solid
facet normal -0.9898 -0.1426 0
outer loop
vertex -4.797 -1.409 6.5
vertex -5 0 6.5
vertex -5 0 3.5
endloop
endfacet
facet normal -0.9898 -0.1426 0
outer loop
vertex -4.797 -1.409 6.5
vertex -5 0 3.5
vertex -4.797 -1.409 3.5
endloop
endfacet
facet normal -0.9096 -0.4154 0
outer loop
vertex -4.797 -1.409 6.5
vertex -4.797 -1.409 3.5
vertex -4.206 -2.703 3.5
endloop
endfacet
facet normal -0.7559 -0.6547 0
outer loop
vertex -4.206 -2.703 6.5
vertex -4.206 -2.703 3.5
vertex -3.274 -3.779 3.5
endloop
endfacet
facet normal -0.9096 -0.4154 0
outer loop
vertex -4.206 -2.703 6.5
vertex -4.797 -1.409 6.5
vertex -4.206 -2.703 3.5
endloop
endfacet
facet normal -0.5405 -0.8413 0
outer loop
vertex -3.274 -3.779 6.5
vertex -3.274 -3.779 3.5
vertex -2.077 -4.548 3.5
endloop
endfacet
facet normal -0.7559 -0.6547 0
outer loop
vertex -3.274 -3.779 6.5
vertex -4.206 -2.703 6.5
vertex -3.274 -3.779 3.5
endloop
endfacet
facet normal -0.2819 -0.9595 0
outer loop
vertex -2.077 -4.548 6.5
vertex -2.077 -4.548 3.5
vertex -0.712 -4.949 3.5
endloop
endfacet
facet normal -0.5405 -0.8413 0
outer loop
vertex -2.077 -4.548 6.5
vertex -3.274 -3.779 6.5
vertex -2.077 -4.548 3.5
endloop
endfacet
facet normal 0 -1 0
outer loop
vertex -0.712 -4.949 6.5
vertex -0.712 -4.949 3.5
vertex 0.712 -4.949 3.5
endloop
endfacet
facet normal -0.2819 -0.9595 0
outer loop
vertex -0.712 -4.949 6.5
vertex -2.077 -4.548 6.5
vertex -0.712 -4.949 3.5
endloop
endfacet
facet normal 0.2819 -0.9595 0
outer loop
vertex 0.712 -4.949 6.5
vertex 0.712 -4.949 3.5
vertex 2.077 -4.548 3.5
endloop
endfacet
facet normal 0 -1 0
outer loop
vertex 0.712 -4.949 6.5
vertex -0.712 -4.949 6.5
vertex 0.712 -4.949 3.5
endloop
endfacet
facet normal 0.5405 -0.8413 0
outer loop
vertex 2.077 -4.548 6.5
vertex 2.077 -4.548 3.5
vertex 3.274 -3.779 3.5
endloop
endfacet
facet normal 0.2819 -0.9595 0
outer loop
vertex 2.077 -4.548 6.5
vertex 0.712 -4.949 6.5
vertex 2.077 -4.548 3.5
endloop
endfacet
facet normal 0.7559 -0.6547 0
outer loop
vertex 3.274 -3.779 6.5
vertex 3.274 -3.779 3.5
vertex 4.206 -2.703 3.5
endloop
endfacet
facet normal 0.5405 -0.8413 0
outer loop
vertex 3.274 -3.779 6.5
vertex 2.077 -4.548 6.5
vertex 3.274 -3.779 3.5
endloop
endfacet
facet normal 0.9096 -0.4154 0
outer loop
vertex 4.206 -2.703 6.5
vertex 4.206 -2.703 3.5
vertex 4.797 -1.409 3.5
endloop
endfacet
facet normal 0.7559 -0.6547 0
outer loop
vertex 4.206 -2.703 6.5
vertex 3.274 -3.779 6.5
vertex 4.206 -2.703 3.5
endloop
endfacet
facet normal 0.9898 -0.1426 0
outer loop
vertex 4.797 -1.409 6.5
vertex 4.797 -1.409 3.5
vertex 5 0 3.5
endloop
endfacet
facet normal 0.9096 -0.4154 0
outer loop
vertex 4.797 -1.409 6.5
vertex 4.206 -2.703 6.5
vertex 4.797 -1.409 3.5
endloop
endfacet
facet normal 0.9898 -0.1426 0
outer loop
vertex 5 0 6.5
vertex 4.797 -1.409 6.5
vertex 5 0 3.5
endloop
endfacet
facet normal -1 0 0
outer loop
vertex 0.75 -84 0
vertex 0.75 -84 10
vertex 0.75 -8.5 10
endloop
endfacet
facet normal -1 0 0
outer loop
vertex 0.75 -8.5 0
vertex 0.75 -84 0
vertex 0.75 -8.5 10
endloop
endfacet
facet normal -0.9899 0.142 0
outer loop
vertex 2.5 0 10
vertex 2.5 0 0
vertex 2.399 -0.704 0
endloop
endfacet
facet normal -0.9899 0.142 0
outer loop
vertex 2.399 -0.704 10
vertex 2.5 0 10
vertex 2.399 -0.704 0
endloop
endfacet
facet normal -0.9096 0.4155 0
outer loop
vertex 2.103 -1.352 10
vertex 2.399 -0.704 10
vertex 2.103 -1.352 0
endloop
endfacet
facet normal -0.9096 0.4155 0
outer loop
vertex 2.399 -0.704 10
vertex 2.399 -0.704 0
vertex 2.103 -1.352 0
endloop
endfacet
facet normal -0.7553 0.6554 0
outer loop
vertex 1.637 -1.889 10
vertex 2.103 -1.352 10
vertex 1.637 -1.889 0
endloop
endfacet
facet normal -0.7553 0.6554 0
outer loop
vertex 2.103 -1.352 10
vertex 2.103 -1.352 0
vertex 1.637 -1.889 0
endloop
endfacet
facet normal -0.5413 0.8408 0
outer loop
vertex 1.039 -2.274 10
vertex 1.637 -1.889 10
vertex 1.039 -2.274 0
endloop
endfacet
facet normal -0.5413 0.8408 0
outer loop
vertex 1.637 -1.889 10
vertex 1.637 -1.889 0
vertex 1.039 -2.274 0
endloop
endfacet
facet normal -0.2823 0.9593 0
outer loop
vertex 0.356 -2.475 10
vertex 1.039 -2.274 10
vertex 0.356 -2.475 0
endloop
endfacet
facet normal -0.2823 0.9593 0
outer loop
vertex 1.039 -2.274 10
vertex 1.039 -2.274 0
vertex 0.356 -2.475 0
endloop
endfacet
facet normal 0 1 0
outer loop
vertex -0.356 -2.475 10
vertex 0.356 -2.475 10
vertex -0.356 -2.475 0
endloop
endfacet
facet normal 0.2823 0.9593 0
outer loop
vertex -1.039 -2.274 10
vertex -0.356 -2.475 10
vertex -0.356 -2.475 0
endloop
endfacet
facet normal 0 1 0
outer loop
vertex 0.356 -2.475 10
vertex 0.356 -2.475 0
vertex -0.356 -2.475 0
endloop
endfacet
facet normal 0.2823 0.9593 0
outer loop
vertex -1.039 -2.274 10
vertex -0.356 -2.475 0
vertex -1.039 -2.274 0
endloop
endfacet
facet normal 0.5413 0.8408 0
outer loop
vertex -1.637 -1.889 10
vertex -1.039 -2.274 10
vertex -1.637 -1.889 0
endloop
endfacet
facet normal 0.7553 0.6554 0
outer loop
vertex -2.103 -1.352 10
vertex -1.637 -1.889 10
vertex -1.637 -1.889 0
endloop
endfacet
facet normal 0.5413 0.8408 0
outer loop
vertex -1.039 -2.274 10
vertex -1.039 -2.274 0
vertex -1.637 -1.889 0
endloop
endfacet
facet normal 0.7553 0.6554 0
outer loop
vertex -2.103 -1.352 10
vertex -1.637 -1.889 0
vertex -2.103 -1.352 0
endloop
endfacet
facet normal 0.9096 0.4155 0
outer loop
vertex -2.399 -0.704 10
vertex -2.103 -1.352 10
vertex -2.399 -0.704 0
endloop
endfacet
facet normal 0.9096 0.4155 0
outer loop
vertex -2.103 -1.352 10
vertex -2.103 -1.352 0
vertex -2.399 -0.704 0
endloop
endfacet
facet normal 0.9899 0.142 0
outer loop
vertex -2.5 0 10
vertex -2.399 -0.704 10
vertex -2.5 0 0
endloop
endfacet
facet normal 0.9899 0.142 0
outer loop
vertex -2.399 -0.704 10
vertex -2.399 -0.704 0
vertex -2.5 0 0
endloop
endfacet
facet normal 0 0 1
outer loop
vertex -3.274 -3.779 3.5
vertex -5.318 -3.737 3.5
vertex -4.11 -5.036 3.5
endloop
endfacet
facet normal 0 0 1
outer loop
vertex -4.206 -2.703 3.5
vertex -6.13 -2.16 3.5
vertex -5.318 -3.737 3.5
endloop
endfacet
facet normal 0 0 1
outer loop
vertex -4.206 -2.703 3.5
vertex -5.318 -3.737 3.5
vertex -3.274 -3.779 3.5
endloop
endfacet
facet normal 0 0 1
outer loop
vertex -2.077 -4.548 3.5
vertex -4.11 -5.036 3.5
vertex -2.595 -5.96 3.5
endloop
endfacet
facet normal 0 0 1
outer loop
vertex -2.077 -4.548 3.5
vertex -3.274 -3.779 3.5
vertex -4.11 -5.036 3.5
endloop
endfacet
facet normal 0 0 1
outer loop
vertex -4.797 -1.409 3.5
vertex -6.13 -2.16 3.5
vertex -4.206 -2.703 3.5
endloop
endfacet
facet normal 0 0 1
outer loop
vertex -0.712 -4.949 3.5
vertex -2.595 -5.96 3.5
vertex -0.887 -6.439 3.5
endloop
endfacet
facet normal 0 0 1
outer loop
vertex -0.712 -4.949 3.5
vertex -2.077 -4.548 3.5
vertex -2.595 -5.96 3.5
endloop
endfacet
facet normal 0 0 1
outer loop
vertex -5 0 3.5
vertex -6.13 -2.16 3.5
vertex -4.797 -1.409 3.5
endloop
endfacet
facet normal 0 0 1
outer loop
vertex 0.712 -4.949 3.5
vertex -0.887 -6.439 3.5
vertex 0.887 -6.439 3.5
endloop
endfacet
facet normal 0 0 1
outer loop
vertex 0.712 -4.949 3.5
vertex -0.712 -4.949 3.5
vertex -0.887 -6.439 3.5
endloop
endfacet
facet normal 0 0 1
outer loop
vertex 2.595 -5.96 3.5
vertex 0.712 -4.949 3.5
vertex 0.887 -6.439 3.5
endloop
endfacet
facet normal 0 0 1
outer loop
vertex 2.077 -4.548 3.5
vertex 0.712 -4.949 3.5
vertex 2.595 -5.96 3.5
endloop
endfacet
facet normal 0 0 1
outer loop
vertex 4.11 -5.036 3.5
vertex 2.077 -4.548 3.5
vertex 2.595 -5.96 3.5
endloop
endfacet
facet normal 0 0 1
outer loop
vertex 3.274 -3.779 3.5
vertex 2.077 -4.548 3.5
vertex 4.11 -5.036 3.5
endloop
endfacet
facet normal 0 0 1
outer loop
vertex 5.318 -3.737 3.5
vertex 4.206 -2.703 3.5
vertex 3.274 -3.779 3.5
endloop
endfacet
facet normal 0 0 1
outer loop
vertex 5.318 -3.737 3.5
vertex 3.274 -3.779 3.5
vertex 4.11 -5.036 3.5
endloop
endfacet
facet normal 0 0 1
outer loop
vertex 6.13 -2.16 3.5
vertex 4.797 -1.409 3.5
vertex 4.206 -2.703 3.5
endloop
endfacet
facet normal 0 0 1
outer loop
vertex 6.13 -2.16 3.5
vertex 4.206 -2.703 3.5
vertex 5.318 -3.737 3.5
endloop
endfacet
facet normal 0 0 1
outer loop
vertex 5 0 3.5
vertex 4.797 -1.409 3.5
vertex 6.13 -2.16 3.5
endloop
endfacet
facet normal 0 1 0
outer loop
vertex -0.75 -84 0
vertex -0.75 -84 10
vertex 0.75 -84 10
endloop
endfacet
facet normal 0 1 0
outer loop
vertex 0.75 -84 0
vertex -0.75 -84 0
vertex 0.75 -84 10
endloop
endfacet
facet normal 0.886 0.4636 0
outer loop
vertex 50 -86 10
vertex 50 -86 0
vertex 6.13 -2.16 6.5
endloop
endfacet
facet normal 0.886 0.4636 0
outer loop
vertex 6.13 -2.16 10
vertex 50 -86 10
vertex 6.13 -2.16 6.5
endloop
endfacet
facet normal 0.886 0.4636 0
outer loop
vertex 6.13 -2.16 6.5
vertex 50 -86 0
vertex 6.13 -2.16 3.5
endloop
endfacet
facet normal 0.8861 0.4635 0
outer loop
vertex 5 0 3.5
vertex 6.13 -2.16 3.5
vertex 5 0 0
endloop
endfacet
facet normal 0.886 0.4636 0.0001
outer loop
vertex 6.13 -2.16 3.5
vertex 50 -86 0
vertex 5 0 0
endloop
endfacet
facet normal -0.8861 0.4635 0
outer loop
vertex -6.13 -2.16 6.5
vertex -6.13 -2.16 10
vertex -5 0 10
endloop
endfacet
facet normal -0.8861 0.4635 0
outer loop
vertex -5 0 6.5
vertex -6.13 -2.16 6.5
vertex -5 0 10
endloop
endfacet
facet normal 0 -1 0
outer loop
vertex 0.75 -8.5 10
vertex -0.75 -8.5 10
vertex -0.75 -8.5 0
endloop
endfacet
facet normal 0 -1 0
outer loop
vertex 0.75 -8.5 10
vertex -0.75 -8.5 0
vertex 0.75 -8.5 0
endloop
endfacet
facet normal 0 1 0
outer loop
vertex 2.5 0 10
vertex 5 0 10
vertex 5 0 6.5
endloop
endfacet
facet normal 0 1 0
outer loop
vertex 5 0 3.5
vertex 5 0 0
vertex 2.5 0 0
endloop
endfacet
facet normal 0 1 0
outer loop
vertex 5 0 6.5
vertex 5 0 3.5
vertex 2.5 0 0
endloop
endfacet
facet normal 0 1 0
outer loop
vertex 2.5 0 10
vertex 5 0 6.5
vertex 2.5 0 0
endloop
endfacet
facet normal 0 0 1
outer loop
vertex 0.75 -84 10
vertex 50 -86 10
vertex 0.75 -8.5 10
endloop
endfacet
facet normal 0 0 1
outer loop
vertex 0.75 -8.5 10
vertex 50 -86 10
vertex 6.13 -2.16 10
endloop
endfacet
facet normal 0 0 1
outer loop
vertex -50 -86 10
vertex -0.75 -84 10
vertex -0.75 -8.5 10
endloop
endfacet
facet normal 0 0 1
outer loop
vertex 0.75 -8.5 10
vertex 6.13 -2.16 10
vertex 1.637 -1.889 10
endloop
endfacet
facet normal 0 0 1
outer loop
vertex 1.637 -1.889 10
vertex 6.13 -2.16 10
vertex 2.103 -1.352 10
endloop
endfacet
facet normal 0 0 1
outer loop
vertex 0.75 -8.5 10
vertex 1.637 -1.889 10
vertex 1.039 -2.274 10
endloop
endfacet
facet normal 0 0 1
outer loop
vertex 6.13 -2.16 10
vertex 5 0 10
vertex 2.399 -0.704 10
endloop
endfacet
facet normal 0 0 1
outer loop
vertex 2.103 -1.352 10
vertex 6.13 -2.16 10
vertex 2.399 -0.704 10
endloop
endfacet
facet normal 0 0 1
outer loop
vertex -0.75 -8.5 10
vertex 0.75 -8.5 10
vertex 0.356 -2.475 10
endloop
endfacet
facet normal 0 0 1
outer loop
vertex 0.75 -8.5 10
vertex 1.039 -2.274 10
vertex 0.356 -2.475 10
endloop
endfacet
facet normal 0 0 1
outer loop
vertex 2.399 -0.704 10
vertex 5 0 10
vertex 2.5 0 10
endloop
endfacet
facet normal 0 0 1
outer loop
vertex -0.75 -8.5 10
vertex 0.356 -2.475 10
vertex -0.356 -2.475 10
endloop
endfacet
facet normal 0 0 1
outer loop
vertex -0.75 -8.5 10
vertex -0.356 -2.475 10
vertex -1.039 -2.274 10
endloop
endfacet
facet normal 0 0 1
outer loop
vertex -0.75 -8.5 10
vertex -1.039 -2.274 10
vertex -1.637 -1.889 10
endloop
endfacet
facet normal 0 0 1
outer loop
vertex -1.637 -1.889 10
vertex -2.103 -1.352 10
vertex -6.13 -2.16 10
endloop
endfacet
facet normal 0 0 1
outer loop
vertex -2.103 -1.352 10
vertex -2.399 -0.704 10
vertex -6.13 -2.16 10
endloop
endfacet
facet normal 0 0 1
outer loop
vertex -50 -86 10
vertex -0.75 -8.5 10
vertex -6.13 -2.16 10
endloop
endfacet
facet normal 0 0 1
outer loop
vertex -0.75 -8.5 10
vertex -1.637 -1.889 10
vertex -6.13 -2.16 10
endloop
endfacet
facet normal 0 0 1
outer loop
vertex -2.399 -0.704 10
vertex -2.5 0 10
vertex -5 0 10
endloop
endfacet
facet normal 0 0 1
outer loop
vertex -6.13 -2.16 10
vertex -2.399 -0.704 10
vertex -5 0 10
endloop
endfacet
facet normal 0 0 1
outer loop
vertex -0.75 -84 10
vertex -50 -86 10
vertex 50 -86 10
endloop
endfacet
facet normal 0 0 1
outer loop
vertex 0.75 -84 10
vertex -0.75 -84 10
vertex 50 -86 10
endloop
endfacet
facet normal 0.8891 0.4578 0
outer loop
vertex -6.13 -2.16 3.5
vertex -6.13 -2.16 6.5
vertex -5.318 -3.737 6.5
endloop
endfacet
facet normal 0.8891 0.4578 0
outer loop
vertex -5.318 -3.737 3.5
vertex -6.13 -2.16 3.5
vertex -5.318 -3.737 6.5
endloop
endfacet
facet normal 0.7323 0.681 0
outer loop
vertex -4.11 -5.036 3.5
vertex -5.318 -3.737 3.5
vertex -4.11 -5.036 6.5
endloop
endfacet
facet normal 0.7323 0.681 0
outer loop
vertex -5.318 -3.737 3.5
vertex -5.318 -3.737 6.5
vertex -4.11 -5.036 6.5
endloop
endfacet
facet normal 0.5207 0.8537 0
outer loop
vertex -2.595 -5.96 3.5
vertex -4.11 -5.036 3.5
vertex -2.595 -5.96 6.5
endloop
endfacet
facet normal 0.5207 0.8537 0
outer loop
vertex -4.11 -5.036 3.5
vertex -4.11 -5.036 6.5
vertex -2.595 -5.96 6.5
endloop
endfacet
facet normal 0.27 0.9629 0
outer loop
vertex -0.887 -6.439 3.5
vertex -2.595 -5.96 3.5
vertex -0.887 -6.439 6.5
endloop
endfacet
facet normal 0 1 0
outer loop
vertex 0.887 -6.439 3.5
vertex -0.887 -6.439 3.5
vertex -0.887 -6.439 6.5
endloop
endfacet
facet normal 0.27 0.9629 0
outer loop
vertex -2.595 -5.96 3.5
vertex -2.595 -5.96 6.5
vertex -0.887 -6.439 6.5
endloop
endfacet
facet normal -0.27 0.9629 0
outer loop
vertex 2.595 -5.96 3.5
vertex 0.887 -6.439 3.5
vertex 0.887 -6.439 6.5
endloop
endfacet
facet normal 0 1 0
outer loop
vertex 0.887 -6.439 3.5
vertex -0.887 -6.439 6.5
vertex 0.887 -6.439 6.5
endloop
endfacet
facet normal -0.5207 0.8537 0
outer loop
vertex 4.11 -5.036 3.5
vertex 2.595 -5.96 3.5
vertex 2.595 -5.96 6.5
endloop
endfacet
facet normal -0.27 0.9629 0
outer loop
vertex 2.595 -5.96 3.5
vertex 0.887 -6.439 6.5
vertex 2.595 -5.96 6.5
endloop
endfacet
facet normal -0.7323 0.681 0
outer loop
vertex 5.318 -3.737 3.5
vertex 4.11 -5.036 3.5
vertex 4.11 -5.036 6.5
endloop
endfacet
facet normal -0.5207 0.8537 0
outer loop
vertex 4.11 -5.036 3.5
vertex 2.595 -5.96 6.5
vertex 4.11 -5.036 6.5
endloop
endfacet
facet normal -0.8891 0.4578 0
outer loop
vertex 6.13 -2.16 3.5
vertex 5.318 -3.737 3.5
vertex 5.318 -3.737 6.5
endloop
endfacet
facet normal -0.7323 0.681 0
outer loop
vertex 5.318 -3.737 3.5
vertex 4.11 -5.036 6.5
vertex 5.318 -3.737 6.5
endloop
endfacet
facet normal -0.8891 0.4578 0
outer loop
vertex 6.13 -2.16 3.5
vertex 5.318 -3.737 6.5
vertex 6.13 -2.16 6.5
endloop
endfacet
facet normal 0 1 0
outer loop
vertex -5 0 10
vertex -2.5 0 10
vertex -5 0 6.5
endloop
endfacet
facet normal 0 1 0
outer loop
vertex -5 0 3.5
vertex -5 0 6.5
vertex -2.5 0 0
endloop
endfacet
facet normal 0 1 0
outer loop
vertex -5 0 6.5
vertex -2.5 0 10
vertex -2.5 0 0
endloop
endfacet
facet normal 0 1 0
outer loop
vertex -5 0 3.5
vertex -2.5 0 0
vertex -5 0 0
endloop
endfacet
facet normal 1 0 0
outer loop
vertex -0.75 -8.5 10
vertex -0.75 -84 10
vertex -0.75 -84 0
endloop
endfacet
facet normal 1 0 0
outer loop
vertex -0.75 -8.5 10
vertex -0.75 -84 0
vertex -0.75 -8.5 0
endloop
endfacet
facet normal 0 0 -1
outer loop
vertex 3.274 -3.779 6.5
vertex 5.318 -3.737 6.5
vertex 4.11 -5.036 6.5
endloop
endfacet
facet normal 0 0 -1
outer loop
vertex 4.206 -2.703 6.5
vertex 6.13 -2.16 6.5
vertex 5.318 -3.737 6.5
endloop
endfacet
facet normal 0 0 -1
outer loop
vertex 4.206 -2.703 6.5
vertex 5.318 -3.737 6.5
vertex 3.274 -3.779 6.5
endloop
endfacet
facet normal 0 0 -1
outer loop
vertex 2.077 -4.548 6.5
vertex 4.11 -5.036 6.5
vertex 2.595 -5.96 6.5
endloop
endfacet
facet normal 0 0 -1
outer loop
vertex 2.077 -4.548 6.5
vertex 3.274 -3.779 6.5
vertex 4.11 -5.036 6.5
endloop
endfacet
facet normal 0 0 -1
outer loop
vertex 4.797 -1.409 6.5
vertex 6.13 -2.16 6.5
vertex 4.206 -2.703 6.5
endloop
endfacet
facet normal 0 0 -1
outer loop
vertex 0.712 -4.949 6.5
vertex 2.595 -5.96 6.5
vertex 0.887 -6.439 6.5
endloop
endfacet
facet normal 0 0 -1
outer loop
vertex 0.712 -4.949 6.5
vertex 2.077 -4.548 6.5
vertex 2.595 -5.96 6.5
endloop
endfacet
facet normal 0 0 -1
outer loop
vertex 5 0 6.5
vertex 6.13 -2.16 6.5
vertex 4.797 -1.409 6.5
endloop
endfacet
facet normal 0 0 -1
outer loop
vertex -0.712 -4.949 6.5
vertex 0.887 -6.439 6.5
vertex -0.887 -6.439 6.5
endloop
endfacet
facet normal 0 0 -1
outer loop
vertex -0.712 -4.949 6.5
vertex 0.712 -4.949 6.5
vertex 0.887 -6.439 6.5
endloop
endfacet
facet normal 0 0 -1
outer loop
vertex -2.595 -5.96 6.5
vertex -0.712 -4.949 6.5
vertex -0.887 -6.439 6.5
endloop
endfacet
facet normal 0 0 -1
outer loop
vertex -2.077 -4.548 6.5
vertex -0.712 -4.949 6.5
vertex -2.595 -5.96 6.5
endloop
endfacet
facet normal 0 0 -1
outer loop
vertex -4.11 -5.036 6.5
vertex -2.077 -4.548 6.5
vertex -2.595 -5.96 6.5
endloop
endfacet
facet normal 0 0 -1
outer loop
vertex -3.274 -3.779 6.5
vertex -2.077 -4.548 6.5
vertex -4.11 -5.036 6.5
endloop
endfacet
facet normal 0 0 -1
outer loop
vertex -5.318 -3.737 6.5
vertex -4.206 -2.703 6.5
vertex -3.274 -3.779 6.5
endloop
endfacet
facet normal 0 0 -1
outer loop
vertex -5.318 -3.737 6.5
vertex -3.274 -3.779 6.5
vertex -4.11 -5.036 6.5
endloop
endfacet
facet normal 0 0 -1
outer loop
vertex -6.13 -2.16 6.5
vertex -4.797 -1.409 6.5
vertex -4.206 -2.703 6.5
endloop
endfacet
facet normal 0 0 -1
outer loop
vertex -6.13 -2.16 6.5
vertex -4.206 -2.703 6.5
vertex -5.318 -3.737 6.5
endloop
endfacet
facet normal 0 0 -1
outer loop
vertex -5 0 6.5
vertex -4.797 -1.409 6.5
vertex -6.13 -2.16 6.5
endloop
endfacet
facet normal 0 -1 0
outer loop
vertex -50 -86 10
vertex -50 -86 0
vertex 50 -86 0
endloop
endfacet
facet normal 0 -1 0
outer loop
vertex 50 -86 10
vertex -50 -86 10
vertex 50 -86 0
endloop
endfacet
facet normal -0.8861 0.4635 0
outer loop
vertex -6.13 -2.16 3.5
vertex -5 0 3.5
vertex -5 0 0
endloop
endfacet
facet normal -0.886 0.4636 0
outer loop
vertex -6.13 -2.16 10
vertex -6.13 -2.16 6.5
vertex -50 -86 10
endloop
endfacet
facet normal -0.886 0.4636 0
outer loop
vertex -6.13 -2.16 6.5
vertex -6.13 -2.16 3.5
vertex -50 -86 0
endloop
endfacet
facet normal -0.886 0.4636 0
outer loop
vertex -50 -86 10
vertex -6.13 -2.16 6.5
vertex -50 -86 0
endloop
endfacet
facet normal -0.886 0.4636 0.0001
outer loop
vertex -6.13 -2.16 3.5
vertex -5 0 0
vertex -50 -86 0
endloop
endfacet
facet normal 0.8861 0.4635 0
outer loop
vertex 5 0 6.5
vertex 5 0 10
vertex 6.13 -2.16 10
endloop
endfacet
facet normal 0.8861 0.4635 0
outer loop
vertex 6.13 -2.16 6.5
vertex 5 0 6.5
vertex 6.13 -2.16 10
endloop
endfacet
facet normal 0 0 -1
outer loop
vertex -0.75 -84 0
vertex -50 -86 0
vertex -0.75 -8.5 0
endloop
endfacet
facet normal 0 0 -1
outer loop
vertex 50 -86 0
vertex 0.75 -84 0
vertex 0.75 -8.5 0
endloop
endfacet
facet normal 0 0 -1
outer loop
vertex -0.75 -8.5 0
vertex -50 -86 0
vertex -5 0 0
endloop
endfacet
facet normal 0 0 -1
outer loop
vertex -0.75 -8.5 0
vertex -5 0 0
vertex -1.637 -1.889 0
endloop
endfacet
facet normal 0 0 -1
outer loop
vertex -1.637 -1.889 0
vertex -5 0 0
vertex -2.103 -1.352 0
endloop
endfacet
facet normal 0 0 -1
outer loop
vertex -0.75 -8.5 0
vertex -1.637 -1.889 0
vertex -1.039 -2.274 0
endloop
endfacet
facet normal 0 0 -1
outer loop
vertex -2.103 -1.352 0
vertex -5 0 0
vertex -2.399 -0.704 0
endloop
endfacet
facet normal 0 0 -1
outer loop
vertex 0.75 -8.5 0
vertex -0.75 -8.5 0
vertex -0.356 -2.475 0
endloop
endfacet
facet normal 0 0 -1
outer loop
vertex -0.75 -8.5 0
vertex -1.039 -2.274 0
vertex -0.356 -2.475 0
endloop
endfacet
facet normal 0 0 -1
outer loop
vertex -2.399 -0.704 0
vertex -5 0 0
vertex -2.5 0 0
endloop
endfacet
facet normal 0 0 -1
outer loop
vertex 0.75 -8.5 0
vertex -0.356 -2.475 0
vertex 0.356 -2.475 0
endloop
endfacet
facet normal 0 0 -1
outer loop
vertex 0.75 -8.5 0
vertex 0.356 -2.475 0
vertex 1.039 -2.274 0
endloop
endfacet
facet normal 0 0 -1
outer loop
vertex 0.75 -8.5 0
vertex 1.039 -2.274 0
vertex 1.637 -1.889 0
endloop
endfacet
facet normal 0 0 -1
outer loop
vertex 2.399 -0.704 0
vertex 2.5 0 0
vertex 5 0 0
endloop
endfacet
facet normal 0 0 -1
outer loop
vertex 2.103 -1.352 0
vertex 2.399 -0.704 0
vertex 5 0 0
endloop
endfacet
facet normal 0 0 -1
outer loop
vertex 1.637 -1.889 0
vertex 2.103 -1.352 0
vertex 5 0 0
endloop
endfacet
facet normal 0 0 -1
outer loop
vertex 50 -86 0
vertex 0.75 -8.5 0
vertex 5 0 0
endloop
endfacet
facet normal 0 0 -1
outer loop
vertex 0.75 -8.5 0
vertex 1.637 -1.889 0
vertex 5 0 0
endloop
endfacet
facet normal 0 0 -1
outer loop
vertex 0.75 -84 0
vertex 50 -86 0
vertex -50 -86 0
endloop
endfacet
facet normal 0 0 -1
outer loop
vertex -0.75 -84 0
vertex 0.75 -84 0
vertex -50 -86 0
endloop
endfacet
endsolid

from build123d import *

# Parameters (mm, degrees)
BOSS_EXTRUDE1_DEPTH = 10
SKETCH2_R           = 6.5
SKETCH2_R_2         = 5
CUT_EXTRUDE1_DEPTH  = 6.5
BOSS_EXTRUDE2_DEPTH = 3.5
SKETCH4_W           = 1.5
SKETCH4_H           = 75.5
CUT_EXTRUDE2_DEPTH  = 11


with BuildPart() as part:
    # Sketch1 → Boss-Extrude1 (new body)
    with BuildSketch(Plane.XY):
        with BuildLine():
            Line((-50, -86), (50, -86))
            Line((50, -86), (5, 0))
            Line((5, 0), (2.5, 0))
            ThreePointArc((2.5, 0), (0, -2.5), (-2.5, 0))
            Line((-2.5, 0), (-5, 0))
            Line((-5, 0), (-50, -86))
        make_face()
    extrude(amount=BOSS_EXTRUDE1_DEPTH)

    # Sketch2 → Cut-Extrude1 (cut)
    with BuildSketch(Plane.XY.offset(10)):
        Circle(SKETCH2_R)
        Circle(SKETCH2_R_2, mode=Mode.SUBTRACT)
    extrude(amount=-CUT_EXTRUDE1_DEPTH, mode=Mode.SUBTRACT)

    # Sketch3 → Boss-Extrude2 (add)
    with BuildSketch(Plane.XY.offset(10)):
        with BuildLine():
            Line((5, 0), (6.130459134, -2.160433012))
            ThreePointArc((6.130459134, -2.160433012), (0, -6.5), (-6.130459134, -2.160433012))
            Line((-6.130459134, -2.160433012), (-5, 0))
            ThreePointArc((-5, 0), (0, -5), (5, 0))
        make_face()
    extrude(amount=-BOSS_EXTRUDE2_DEPTH)

    # Sketch4 → Cut-Extrude2 (cut, through all)
    with BuildSketch(Plane.XY.offset(10)):
        with Locations((0, -46.25)):
            Rectangle(SKETCH4_W, SKETCH4_H)
    extrude(amount=-CUT_EXTRUDE2_DEPTH, mode=Mode.SUBTRACT)


solid = part.part
